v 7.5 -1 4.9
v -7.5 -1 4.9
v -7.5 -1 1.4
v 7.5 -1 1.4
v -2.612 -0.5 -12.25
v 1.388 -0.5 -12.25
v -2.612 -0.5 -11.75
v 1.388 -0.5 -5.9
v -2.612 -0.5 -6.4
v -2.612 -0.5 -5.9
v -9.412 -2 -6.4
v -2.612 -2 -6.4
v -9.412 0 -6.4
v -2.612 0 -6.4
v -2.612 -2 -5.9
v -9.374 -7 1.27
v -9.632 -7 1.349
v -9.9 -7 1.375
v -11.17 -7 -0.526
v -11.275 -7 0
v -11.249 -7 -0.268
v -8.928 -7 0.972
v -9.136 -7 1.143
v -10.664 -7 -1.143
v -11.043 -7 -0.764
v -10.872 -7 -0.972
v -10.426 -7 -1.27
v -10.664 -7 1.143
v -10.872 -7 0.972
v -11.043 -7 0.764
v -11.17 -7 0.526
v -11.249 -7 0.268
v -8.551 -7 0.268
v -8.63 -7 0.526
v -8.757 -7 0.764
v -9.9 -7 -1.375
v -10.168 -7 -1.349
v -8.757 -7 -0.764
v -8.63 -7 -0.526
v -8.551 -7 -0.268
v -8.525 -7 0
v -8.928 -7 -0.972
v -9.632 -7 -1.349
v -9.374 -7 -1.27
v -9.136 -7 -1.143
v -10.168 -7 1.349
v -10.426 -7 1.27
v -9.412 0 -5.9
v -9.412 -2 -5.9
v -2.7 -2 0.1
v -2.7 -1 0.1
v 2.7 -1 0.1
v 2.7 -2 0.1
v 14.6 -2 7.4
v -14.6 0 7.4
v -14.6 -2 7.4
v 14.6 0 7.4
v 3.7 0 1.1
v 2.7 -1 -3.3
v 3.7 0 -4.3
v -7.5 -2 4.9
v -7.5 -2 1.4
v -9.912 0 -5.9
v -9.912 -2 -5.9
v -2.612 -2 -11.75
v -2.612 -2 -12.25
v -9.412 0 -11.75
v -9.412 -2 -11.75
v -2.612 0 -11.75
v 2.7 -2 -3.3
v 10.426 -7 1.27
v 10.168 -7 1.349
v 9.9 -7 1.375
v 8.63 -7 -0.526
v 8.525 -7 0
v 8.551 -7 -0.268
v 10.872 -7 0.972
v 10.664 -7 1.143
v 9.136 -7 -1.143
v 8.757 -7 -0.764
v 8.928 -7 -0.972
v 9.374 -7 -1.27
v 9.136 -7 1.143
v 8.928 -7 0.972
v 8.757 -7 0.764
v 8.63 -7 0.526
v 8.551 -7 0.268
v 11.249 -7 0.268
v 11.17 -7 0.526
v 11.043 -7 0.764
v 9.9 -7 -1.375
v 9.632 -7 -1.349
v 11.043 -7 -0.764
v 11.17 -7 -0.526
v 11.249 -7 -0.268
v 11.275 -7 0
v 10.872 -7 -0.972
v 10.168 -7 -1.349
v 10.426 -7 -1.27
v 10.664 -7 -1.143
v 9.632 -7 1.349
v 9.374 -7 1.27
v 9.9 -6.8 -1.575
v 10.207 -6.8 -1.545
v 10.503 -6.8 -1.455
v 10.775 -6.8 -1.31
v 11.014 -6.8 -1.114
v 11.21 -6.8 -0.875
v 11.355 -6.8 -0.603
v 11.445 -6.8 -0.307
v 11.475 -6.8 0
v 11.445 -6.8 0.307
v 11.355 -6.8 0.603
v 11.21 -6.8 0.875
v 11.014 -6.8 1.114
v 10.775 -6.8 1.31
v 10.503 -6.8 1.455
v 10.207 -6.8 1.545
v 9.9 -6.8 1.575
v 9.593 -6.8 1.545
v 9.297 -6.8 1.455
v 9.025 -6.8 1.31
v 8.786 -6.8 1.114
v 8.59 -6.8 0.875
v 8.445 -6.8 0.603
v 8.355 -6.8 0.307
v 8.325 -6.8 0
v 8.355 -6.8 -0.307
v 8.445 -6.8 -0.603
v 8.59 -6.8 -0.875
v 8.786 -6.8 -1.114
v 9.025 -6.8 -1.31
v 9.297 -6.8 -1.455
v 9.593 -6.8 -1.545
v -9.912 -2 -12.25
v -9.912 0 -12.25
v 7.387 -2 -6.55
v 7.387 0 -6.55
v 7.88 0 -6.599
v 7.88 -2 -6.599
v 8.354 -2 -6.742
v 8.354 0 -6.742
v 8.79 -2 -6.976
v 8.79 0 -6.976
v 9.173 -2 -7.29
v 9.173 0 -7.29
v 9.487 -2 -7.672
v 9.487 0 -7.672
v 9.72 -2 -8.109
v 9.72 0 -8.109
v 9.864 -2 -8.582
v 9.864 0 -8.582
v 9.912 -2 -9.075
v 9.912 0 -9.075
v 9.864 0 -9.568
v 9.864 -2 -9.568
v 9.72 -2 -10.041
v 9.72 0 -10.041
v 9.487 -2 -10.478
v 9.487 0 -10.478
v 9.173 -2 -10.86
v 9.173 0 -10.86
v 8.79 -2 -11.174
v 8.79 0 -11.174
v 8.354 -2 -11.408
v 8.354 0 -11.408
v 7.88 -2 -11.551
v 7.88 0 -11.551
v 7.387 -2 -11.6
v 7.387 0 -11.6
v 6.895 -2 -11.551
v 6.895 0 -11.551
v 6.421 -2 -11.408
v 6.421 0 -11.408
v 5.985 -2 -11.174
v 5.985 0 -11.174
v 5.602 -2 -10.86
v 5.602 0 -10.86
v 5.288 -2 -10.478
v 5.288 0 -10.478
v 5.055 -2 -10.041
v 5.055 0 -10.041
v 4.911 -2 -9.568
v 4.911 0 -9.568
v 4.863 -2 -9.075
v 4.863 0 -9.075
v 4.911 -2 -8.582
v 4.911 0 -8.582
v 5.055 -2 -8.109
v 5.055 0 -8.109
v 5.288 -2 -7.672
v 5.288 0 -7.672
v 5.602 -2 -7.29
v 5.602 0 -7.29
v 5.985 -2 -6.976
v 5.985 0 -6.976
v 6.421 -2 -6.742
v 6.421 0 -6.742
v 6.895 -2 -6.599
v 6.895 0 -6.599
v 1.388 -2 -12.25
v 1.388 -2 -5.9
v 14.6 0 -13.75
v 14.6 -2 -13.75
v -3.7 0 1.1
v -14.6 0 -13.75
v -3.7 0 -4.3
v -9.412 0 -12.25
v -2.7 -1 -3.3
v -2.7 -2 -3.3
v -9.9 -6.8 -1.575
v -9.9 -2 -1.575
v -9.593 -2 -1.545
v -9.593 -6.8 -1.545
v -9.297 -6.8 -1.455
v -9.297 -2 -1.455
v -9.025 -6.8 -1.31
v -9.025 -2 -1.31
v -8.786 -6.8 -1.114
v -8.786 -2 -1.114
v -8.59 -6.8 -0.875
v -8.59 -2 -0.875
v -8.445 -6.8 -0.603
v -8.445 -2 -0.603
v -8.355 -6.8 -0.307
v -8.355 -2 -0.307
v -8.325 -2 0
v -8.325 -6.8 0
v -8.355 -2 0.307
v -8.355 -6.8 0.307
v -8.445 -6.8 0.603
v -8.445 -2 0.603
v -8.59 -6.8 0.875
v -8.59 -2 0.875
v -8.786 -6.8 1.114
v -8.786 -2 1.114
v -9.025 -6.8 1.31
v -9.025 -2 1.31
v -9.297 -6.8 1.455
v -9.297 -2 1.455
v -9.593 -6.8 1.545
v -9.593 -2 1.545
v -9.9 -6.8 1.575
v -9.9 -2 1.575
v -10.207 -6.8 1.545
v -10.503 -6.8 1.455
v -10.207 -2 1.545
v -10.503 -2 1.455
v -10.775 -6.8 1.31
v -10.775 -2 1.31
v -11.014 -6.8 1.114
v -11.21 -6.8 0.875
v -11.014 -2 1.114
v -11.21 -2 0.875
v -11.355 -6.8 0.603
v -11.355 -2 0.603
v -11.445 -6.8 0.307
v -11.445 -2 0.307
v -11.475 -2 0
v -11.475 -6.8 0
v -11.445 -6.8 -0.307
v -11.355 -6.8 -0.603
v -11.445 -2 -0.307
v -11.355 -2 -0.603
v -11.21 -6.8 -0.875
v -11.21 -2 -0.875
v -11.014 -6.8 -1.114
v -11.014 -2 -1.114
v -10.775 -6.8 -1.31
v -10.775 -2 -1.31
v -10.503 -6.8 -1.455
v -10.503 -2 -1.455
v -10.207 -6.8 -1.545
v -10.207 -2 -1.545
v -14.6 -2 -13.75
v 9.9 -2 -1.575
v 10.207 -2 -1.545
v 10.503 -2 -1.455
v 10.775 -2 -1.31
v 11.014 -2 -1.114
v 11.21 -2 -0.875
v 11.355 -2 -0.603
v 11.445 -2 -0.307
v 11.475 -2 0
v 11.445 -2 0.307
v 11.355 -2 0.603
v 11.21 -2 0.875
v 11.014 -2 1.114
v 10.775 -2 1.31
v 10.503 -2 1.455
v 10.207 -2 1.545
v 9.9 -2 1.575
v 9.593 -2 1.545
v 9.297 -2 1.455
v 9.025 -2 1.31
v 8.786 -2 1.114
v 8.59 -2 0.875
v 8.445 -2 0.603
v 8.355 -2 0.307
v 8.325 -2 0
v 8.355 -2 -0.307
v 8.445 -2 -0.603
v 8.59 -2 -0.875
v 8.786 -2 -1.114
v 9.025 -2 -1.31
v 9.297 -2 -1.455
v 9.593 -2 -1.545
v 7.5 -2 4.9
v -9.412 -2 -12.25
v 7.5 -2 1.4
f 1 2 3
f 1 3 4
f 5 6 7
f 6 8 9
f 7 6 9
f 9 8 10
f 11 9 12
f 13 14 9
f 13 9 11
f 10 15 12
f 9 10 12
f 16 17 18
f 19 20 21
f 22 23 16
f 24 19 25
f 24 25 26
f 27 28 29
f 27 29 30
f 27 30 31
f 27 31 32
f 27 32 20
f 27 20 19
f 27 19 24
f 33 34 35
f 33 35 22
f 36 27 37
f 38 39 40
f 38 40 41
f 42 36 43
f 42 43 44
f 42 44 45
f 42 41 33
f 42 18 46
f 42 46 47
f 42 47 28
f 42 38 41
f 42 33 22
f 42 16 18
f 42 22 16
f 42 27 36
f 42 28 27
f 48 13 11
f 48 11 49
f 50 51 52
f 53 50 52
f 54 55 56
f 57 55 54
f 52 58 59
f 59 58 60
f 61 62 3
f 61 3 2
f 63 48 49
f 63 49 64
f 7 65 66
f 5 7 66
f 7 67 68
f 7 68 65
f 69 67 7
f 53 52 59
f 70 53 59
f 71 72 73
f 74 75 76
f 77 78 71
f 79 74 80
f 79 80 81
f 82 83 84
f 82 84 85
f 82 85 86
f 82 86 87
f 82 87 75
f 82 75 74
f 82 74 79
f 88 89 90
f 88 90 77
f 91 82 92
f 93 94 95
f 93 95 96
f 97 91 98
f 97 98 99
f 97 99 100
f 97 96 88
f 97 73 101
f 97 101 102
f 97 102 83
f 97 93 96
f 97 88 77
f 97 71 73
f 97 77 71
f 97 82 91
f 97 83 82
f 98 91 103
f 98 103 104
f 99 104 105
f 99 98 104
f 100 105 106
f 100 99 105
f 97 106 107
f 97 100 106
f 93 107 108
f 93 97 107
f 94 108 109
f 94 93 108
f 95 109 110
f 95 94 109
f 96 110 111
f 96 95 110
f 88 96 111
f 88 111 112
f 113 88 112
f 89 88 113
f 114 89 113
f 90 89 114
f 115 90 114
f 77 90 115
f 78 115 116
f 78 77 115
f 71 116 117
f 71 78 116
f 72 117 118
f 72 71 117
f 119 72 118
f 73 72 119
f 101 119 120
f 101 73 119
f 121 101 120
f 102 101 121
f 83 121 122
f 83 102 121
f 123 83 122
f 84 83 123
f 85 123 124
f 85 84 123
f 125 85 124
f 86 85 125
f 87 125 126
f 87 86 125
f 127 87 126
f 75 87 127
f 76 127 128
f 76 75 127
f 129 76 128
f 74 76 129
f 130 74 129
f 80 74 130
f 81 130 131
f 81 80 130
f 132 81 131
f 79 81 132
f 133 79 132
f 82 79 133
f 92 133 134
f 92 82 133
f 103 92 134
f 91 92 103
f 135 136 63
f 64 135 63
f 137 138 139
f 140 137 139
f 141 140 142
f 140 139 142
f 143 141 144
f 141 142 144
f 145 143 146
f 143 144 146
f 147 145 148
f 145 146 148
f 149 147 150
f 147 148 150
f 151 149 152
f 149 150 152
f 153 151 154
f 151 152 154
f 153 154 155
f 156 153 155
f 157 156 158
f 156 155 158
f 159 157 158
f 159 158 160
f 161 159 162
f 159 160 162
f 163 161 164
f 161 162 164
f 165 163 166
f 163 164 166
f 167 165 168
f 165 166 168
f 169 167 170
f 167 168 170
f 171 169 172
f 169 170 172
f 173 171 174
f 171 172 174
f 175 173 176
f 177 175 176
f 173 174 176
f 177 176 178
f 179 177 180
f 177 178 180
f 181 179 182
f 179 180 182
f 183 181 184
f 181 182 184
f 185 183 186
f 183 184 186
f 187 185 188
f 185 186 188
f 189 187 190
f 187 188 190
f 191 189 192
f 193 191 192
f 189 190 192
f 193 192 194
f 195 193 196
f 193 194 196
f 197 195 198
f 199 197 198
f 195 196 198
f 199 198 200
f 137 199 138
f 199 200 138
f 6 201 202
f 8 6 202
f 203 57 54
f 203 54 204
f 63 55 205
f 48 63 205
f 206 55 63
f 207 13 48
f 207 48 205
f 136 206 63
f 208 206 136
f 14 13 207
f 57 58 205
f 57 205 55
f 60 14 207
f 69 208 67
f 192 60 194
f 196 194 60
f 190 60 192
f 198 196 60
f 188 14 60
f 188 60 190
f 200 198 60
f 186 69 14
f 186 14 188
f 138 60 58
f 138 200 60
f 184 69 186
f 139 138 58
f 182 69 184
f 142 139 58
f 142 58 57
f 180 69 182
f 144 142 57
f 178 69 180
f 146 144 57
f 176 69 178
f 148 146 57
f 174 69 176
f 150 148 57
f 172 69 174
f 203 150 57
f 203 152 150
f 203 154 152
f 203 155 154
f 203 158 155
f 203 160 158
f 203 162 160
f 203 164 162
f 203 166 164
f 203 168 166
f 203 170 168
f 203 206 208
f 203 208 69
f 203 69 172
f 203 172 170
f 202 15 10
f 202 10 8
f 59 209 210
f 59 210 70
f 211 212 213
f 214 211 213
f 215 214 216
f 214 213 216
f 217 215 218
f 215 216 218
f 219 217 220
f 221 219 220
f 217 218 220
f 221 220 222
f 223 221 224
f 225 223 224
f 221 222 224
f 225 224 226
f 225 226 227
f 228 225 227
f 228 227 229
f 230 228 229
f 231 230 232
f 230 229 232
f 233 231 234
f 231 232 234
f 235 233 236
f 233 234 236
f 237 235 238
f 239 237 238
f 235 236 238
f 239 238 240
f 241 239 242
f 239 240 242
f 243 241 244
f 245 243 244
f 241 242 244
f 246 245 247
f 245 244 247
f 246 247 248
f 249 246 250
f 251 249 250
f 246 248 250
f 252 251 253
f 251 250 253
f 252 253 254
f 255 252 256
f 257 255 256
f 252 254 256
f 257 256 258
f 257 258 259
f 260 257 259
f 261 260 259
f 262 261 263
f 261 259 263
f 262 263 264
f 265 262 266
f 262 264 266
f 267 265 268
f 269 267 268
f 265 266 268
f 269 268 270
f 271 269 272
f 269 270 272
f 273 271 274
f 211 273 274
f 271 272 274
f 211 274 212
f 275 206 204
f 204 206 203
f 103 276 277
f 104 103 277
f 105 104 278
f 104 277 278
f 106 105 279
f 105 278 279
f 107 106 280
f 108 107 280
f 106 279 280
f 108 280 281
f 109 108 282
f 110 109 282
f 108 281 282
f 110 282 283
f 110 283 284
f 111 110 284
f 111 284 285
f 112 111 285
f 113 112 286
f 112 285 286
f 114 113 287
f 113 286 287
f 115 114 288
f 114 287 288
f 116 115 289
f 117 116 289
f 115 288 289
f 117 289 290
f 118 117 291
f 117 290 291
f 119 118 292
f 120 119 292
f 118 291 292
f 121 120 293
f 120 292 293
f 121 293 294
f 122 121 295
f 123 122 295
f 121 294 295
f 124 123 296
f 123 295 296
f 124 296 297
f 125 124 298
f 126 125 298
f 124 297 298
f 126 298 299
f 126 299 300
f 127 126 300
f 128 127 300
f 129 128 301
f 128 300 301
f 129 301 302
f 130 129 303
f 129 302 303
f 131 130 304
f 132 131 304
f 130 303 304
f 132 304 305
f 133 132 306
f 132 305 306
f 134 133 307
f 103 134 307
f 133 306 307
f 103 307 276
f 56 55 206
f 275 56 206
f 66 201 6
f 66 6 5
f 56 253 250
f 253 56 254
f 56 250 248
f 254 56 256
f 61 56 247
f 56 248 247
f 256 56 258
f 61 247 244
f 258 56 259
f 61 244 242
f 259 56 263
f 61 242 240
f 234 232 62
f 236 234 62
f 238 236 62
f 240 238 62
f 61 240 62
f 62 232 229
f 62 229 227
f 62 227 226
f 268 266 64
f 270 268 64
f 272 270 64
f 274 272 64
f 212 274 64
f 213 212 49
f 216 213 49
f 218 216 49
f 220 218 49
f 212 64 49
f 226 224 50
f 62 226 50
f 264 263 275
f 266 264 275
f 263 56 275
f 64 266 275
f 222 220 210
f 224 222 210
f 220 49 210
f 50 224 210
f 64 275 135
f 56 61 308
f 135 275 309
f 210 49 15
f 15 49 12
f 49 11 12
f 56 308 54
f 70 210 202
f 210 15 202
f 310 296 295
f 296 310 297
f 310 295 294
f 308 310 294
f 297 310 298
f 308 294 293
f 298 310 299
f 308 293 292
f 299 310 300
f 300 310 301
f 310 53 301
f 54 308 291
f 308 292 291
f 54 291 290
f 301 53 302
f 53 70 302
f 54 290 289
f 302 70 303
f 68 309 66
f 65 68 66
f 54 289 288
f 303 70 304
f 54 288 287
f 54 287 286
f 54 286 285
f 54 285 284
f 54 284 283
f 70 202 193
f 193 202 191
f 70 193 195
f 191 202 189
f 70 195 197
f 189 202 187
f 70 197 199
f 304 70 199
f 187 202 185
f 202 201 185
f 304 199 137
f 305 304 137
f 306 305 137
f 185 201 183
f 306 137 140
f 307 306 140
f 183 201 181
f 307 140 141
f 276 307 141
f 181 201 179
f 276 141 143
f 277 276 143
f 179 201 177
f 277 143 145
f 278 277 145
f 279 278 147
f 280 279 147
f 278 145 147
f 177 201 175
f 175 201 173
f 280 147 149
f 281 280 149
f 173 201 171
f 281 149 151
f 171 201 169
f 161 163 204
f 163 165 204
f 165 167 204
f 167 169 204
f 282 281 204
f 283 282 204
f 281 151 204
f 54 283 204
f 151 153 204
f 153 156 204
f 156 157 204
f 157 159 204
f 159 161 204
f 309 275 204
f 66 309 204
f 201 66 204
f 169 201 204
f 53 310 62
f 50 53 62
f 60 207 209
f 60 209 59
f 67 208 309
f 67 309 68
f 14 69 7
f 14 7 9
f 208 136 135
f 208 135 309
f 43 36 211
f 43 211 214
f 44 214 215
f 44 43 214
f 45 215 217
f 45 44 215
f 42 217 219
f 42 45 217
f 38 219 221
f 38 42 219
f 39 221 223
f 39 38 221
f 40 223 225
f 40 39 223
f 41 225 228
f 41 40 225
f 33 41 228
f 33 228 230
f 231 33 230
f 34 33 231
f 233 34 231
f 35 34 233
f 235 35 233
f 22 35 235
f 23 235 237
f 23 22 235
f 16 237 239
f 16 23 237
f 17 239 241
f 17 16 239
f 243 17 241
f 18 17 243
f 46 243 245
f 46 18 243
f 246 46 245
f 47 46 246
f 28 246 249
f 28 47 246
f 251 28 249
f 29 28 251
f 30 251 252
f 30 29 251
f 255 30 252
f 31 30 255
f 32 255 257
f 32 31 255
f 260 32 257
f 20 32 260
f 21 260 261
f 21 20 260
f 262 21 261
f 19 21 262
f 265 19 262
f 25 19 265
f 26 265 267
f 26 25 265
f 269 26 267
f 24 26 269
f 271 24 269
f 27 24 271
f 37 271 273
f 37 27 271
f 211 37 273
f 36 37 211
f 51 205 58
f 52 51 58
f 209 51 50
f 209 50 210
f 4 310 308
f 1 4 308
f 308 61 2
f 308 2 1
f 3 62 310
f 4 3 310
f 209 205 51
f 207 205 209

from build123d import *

# Parameters (mm, degrees)
PARTS_W           = 29.2
PARTS_H           = 21.15
MAIN_FACE_DEPTH   = 2
SKETCH3_R         = 2.525
IR_CUT_DEPTH      = 2
TSOP_GROOVE_DEPTH = 1.5
SKETCH4_W         = 5.4
SKETCH4_H         = 3.4
TOF_CUT_DEPTH     = 2
SKETCH6_R         = 1.575
SHAFTS_DEPTH      = 5
CHAMFER1_SIZE     = 0.2
SKETCH7_W         = 15
SKETCH7_H         = 3.5
PINSLOTS_DEPTH    = 1
TOFWINDOW_SIZE    = 1


with BuildPart() as part:
    # Parts → Main Face (new body)
    with BuildSketch(Plane(origin=(0, 0, 0), x_dir=(1, 0, 0), z_dir=(0, 1, 0))):
        with Locations((0, 3.175)):
            Rectangle(PARTS_W, PARTS_H)
    extrude(amount=-MAIN_FACE_DEPTH)

    # Sketch3 → IR Cut (cut)
    with BuildSketch(Plane(origin=(0, 0, 0), x_dir=(1, 0, 0), z_dir=(0, 1, 0))):
        with Locations(Location((7.3875, 9.075, 0), (0, 0, 270))):
            Circle(SKETCH3_R)
        Polygon((-2.6125, 11.75), (-2.6125, 6.4), (-9.4125, 6.4), (-9.4125, 5.9), (-9.9125, 5.9), (-9.9125, 6.4), (-9.9125, 11.75), (-9.9125, 12.25), (-9.4125, 12.25), (-9.4125, 11.75), align=None)
    extrude(amount=-IR_CUT_DEPTH, mode=Mode.SUBTRACT)

    # Sketch5 → TSOP Groove (cut)
    with BuildSketch(Plane.XZ.offset(2)):
        Polygon((-2.6125, -11.75), (-2.6125, -6.4), (-2.6125, -5.9), (1.3875, -5.9), (1.3875, -6.4), (1.3875, -11.75), (1.3875, -12.25), (-2.6125, -12.25), align=None)
    extrude(amount=-TSOP_GROOVE_DEPTH, mode=Mode.SUBTRACT)

    # Sketch4 → TOF Cut (cut)
    with BuildSketch(Plane(origin=(0, 0, 0), x_dir=(1, 0, 0), z_dir=(0, 1, 0))):
        with Locations((0, 1.6)):
            Rectangle(SKETCH4_W, SKETCH4_H)
    extrude(amount=-TOF_CUT_DEPTH, mode=Mode.SUBTRACT)

    # Sketch6 → Shafts (add)
    with BuildSketch(Plane.XZ.offset(2)):
        with Locations(Location((-9.9, 0, 0), (0, 0, 270))):
            Circle(SKETCH6_R)
        with Locations(Location((9.9, 0, 0), (0, 0, 270))):
            Circle(SKETCH6_R)
    extrude(amount=SHAFTS_DEPTH)

    # Chamfer1
    chamfer1_edges = [part.edges().sort_by_distance(p)[0] for p in [
        (9.9, -7, 1.575),
        (-9.9, -7, 1.575),
    ]]
    chamfer(chamfer1_edges, length=CHAMFER1_SIZE)

    # Sketch7 → PinSlots (cut)
    with BuildSketch(Plane.XZ.offset(2)):
        with Locations((0, 3.15)):
            Rectangle(SKETCH7_W, SKETCH7_H)
    extrude(amount=-PINSLOTS_DEPTH, mode=Mode.SUBTRACT)

    # ToFWindow
    tofwindow_edges = [part.edges().sort_by_distance(p)[0] for p in [
        (-2.7, 0, -1.6),
        (0, 0, 0.1),
        (2.7, 0, -1.6),
        (0, 0, -3.3),
    ]]
    chamfer(tofwindow_edges, length=TOFWINDOW_SIZE)


solid = part.part
